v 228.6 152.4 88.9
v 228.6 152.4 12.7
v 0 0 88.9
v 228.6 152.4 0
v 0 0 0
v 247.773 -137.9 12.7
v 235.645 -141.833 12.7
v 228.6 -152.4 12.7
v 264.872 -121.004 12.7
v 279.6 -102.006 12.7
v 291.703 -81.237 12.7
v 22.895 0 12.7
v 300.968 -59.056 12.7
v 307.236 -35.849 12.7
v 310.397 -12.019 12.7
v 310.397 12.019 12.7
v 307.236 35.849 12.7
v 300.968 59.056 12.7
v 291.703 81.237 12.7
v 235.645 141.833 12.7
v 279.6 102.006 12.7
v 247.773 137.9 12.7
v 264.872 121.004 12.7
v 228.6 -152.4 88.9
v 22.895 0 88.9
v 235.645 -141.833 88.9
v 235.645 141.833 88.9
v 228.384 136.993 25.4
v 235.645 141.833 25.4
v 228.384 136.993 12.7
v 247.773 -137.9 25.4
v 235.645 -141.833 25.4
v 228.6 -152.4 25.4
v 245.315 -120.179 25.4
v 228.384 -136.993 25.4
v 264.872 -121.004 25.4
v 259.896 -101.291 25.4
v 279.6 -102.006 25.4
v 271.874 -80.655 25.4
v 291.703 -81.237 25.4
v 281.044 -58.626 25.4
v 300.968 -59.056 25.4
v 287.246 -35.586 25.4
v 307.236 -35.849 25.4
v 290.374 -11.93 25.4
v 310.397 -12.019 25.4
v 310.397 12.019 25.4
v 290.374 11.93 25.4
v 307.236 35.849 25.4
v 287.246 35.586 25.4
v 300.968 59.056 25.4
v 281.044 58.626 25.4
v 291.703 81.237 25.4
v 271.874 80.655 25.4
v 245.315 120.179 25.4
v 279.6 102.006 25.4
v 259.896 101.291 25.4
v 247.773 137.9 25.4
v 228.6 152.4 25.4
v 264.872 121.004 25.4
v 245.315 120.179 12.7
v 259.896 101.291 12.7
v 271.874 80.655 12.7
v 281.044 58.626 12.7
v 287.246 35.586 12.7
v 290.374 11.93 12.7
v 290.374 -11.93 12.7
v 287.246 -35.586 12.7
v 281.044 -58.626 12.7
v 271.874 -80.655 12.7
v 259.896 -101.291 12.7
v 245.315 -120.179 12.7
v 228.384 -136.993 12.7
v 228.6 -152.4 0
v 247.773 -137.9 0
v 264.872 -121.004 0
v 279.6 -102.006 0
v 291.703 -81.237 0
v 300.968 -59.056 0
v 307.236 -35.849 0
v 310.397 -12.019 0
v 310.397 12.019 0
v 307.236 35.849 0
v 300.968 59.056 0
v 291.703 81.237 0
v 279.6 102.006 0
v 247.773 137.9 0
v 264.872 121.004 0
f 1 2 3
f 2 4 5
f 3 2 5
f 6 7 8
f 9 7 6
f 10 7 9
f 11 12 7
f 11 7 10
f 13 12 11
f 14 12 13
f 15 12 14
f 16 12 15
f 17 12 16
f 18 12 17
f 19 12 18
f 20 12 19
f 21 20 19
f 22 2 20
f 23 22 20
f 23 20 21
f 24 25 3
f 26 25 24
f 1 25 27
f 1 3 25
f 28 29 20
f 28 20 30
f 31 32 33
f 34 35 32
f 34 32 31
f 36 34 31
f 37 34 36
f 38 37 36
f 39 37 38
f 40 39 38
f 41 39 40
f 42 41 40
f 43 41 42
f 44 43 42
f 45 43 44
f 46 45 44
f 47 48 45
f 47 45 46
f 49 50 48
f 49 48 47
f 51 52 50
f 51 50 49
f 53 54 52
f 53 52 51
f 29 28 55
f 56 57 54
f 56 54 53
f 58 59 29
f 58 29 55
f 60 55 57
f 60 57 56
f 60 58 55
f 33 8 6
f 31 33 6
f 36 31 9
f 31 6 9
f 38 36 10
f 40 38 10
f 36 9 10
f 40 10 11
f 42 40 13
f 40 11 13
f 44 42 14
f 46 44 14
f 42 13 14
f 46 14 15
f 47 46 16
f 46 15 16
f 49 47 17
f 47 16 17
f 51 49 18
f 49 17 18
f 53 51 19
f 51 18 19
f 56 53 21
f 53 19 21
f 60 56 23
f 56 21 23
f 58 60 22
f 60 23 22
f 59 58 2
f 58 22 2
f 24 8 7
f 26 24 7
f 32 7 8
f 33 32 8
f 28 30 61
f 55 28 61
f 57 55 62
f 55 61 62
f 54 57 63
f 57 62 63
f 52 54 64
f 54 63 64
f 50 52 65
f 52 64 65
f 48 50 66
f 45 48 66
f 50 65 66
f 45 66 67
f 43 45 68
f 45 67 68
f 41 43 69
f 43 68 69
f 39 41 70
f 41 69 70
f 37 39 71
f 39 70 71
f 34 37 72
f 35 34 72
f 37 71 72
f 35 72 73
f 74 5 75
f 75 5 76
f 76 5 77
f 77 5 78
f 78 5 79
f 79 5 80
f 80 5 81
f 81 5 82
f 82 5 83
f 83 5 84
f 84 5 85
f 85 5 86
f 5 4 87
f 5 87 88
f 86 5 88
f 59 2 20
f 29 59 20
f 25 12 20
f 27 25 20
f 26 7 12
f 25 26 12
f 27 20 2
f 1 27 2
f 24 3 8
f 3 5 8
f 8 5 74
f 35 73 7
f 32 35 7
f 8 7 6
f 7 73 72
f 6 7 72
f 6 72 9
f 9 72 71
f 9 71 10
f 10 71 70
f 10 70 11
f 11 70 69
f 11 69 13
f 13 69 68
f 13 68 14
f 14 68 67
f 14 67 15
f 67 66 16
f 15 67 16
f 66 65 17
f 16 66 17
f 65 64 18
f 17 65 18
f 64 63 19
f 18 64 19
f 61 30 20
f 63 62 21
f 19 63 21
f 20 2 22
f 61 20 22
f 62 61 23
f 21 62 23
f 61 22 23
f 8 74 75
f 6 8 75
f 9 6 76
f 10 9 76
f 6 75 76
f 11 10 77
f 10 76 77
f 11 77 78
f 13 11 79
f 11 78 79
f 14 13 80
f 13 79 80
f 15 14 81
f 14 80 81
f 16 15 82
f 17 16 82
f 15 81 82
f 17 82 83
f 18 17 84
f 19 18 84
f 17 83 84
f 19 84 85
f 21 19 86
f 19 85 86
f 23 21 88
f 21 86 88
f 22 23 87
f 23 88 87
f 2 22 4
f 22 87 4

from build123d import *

# Parameters (mm, degrees)
F1_DEPTH = 12.7
F3_DEPTH = 76.2
F5_DEPTH = 12.7


with BuildPart() as f1:
    # F0 (on Top) → F1 (new body)
    with BuildSketch(Plane.XY):
        Polygon((228.6, 152.4), (0, 0), (228.6, 0), align=None)
        Polygon((228.6, 0), (0, 0), (228.6, -152.4), align=None)
        with BuildLine():
            Line((228.6, 152.4), (228.6, 0))
            Line((228.6, 0), (228.6, -152.4))
            ThreePointArc((228.6, -152.4), (310.793908, 0), (228.6, 152.4))
        make_face()
    extrude(amount=F1_DEPTH)

    # F2 (on face) → F3 (join)
    with BuildSketch(Plane.XY.offset(12.7)):
        Polygon((235.644692, 141.832961), (228.6, 152.4), (11.447625, 7.63175), (22.895251, 0), align=None)
        Polygon((0, 0), (228.6, -152.4), (235.644692, -141.832961), (22.895251, 0), (11.447625, 7.63175), align=None)
    extrude(amount=F3_DEPTH)


with BuildPart() as f5:
    # F4 (on face) → F5 (new body)
    with BuildSketch(Plane.XY.offset(12.7)):
        with BuildLine():
            Line((235.644692, -141.832961), (228.6, -152.4))
            ThreePointArc((228.6, -152.4), (310.793908, 0), (228.6, 152.4))
            Line((228.6, 152.4), (235.644692, 141.832961))
            Line((235.644692, 141.832961), (228.384268, 136.992678))
            ThreePointArc((228.384268, 136.992678), (290.766762, 0), (228.384268, -136.992678))
            Line((228.384268, -136.992678), (235.644692, -141.832961))
        make_face()
    extrude(amount=F5_DEPTH)


solid = Compound([f1.part, f5.part])
